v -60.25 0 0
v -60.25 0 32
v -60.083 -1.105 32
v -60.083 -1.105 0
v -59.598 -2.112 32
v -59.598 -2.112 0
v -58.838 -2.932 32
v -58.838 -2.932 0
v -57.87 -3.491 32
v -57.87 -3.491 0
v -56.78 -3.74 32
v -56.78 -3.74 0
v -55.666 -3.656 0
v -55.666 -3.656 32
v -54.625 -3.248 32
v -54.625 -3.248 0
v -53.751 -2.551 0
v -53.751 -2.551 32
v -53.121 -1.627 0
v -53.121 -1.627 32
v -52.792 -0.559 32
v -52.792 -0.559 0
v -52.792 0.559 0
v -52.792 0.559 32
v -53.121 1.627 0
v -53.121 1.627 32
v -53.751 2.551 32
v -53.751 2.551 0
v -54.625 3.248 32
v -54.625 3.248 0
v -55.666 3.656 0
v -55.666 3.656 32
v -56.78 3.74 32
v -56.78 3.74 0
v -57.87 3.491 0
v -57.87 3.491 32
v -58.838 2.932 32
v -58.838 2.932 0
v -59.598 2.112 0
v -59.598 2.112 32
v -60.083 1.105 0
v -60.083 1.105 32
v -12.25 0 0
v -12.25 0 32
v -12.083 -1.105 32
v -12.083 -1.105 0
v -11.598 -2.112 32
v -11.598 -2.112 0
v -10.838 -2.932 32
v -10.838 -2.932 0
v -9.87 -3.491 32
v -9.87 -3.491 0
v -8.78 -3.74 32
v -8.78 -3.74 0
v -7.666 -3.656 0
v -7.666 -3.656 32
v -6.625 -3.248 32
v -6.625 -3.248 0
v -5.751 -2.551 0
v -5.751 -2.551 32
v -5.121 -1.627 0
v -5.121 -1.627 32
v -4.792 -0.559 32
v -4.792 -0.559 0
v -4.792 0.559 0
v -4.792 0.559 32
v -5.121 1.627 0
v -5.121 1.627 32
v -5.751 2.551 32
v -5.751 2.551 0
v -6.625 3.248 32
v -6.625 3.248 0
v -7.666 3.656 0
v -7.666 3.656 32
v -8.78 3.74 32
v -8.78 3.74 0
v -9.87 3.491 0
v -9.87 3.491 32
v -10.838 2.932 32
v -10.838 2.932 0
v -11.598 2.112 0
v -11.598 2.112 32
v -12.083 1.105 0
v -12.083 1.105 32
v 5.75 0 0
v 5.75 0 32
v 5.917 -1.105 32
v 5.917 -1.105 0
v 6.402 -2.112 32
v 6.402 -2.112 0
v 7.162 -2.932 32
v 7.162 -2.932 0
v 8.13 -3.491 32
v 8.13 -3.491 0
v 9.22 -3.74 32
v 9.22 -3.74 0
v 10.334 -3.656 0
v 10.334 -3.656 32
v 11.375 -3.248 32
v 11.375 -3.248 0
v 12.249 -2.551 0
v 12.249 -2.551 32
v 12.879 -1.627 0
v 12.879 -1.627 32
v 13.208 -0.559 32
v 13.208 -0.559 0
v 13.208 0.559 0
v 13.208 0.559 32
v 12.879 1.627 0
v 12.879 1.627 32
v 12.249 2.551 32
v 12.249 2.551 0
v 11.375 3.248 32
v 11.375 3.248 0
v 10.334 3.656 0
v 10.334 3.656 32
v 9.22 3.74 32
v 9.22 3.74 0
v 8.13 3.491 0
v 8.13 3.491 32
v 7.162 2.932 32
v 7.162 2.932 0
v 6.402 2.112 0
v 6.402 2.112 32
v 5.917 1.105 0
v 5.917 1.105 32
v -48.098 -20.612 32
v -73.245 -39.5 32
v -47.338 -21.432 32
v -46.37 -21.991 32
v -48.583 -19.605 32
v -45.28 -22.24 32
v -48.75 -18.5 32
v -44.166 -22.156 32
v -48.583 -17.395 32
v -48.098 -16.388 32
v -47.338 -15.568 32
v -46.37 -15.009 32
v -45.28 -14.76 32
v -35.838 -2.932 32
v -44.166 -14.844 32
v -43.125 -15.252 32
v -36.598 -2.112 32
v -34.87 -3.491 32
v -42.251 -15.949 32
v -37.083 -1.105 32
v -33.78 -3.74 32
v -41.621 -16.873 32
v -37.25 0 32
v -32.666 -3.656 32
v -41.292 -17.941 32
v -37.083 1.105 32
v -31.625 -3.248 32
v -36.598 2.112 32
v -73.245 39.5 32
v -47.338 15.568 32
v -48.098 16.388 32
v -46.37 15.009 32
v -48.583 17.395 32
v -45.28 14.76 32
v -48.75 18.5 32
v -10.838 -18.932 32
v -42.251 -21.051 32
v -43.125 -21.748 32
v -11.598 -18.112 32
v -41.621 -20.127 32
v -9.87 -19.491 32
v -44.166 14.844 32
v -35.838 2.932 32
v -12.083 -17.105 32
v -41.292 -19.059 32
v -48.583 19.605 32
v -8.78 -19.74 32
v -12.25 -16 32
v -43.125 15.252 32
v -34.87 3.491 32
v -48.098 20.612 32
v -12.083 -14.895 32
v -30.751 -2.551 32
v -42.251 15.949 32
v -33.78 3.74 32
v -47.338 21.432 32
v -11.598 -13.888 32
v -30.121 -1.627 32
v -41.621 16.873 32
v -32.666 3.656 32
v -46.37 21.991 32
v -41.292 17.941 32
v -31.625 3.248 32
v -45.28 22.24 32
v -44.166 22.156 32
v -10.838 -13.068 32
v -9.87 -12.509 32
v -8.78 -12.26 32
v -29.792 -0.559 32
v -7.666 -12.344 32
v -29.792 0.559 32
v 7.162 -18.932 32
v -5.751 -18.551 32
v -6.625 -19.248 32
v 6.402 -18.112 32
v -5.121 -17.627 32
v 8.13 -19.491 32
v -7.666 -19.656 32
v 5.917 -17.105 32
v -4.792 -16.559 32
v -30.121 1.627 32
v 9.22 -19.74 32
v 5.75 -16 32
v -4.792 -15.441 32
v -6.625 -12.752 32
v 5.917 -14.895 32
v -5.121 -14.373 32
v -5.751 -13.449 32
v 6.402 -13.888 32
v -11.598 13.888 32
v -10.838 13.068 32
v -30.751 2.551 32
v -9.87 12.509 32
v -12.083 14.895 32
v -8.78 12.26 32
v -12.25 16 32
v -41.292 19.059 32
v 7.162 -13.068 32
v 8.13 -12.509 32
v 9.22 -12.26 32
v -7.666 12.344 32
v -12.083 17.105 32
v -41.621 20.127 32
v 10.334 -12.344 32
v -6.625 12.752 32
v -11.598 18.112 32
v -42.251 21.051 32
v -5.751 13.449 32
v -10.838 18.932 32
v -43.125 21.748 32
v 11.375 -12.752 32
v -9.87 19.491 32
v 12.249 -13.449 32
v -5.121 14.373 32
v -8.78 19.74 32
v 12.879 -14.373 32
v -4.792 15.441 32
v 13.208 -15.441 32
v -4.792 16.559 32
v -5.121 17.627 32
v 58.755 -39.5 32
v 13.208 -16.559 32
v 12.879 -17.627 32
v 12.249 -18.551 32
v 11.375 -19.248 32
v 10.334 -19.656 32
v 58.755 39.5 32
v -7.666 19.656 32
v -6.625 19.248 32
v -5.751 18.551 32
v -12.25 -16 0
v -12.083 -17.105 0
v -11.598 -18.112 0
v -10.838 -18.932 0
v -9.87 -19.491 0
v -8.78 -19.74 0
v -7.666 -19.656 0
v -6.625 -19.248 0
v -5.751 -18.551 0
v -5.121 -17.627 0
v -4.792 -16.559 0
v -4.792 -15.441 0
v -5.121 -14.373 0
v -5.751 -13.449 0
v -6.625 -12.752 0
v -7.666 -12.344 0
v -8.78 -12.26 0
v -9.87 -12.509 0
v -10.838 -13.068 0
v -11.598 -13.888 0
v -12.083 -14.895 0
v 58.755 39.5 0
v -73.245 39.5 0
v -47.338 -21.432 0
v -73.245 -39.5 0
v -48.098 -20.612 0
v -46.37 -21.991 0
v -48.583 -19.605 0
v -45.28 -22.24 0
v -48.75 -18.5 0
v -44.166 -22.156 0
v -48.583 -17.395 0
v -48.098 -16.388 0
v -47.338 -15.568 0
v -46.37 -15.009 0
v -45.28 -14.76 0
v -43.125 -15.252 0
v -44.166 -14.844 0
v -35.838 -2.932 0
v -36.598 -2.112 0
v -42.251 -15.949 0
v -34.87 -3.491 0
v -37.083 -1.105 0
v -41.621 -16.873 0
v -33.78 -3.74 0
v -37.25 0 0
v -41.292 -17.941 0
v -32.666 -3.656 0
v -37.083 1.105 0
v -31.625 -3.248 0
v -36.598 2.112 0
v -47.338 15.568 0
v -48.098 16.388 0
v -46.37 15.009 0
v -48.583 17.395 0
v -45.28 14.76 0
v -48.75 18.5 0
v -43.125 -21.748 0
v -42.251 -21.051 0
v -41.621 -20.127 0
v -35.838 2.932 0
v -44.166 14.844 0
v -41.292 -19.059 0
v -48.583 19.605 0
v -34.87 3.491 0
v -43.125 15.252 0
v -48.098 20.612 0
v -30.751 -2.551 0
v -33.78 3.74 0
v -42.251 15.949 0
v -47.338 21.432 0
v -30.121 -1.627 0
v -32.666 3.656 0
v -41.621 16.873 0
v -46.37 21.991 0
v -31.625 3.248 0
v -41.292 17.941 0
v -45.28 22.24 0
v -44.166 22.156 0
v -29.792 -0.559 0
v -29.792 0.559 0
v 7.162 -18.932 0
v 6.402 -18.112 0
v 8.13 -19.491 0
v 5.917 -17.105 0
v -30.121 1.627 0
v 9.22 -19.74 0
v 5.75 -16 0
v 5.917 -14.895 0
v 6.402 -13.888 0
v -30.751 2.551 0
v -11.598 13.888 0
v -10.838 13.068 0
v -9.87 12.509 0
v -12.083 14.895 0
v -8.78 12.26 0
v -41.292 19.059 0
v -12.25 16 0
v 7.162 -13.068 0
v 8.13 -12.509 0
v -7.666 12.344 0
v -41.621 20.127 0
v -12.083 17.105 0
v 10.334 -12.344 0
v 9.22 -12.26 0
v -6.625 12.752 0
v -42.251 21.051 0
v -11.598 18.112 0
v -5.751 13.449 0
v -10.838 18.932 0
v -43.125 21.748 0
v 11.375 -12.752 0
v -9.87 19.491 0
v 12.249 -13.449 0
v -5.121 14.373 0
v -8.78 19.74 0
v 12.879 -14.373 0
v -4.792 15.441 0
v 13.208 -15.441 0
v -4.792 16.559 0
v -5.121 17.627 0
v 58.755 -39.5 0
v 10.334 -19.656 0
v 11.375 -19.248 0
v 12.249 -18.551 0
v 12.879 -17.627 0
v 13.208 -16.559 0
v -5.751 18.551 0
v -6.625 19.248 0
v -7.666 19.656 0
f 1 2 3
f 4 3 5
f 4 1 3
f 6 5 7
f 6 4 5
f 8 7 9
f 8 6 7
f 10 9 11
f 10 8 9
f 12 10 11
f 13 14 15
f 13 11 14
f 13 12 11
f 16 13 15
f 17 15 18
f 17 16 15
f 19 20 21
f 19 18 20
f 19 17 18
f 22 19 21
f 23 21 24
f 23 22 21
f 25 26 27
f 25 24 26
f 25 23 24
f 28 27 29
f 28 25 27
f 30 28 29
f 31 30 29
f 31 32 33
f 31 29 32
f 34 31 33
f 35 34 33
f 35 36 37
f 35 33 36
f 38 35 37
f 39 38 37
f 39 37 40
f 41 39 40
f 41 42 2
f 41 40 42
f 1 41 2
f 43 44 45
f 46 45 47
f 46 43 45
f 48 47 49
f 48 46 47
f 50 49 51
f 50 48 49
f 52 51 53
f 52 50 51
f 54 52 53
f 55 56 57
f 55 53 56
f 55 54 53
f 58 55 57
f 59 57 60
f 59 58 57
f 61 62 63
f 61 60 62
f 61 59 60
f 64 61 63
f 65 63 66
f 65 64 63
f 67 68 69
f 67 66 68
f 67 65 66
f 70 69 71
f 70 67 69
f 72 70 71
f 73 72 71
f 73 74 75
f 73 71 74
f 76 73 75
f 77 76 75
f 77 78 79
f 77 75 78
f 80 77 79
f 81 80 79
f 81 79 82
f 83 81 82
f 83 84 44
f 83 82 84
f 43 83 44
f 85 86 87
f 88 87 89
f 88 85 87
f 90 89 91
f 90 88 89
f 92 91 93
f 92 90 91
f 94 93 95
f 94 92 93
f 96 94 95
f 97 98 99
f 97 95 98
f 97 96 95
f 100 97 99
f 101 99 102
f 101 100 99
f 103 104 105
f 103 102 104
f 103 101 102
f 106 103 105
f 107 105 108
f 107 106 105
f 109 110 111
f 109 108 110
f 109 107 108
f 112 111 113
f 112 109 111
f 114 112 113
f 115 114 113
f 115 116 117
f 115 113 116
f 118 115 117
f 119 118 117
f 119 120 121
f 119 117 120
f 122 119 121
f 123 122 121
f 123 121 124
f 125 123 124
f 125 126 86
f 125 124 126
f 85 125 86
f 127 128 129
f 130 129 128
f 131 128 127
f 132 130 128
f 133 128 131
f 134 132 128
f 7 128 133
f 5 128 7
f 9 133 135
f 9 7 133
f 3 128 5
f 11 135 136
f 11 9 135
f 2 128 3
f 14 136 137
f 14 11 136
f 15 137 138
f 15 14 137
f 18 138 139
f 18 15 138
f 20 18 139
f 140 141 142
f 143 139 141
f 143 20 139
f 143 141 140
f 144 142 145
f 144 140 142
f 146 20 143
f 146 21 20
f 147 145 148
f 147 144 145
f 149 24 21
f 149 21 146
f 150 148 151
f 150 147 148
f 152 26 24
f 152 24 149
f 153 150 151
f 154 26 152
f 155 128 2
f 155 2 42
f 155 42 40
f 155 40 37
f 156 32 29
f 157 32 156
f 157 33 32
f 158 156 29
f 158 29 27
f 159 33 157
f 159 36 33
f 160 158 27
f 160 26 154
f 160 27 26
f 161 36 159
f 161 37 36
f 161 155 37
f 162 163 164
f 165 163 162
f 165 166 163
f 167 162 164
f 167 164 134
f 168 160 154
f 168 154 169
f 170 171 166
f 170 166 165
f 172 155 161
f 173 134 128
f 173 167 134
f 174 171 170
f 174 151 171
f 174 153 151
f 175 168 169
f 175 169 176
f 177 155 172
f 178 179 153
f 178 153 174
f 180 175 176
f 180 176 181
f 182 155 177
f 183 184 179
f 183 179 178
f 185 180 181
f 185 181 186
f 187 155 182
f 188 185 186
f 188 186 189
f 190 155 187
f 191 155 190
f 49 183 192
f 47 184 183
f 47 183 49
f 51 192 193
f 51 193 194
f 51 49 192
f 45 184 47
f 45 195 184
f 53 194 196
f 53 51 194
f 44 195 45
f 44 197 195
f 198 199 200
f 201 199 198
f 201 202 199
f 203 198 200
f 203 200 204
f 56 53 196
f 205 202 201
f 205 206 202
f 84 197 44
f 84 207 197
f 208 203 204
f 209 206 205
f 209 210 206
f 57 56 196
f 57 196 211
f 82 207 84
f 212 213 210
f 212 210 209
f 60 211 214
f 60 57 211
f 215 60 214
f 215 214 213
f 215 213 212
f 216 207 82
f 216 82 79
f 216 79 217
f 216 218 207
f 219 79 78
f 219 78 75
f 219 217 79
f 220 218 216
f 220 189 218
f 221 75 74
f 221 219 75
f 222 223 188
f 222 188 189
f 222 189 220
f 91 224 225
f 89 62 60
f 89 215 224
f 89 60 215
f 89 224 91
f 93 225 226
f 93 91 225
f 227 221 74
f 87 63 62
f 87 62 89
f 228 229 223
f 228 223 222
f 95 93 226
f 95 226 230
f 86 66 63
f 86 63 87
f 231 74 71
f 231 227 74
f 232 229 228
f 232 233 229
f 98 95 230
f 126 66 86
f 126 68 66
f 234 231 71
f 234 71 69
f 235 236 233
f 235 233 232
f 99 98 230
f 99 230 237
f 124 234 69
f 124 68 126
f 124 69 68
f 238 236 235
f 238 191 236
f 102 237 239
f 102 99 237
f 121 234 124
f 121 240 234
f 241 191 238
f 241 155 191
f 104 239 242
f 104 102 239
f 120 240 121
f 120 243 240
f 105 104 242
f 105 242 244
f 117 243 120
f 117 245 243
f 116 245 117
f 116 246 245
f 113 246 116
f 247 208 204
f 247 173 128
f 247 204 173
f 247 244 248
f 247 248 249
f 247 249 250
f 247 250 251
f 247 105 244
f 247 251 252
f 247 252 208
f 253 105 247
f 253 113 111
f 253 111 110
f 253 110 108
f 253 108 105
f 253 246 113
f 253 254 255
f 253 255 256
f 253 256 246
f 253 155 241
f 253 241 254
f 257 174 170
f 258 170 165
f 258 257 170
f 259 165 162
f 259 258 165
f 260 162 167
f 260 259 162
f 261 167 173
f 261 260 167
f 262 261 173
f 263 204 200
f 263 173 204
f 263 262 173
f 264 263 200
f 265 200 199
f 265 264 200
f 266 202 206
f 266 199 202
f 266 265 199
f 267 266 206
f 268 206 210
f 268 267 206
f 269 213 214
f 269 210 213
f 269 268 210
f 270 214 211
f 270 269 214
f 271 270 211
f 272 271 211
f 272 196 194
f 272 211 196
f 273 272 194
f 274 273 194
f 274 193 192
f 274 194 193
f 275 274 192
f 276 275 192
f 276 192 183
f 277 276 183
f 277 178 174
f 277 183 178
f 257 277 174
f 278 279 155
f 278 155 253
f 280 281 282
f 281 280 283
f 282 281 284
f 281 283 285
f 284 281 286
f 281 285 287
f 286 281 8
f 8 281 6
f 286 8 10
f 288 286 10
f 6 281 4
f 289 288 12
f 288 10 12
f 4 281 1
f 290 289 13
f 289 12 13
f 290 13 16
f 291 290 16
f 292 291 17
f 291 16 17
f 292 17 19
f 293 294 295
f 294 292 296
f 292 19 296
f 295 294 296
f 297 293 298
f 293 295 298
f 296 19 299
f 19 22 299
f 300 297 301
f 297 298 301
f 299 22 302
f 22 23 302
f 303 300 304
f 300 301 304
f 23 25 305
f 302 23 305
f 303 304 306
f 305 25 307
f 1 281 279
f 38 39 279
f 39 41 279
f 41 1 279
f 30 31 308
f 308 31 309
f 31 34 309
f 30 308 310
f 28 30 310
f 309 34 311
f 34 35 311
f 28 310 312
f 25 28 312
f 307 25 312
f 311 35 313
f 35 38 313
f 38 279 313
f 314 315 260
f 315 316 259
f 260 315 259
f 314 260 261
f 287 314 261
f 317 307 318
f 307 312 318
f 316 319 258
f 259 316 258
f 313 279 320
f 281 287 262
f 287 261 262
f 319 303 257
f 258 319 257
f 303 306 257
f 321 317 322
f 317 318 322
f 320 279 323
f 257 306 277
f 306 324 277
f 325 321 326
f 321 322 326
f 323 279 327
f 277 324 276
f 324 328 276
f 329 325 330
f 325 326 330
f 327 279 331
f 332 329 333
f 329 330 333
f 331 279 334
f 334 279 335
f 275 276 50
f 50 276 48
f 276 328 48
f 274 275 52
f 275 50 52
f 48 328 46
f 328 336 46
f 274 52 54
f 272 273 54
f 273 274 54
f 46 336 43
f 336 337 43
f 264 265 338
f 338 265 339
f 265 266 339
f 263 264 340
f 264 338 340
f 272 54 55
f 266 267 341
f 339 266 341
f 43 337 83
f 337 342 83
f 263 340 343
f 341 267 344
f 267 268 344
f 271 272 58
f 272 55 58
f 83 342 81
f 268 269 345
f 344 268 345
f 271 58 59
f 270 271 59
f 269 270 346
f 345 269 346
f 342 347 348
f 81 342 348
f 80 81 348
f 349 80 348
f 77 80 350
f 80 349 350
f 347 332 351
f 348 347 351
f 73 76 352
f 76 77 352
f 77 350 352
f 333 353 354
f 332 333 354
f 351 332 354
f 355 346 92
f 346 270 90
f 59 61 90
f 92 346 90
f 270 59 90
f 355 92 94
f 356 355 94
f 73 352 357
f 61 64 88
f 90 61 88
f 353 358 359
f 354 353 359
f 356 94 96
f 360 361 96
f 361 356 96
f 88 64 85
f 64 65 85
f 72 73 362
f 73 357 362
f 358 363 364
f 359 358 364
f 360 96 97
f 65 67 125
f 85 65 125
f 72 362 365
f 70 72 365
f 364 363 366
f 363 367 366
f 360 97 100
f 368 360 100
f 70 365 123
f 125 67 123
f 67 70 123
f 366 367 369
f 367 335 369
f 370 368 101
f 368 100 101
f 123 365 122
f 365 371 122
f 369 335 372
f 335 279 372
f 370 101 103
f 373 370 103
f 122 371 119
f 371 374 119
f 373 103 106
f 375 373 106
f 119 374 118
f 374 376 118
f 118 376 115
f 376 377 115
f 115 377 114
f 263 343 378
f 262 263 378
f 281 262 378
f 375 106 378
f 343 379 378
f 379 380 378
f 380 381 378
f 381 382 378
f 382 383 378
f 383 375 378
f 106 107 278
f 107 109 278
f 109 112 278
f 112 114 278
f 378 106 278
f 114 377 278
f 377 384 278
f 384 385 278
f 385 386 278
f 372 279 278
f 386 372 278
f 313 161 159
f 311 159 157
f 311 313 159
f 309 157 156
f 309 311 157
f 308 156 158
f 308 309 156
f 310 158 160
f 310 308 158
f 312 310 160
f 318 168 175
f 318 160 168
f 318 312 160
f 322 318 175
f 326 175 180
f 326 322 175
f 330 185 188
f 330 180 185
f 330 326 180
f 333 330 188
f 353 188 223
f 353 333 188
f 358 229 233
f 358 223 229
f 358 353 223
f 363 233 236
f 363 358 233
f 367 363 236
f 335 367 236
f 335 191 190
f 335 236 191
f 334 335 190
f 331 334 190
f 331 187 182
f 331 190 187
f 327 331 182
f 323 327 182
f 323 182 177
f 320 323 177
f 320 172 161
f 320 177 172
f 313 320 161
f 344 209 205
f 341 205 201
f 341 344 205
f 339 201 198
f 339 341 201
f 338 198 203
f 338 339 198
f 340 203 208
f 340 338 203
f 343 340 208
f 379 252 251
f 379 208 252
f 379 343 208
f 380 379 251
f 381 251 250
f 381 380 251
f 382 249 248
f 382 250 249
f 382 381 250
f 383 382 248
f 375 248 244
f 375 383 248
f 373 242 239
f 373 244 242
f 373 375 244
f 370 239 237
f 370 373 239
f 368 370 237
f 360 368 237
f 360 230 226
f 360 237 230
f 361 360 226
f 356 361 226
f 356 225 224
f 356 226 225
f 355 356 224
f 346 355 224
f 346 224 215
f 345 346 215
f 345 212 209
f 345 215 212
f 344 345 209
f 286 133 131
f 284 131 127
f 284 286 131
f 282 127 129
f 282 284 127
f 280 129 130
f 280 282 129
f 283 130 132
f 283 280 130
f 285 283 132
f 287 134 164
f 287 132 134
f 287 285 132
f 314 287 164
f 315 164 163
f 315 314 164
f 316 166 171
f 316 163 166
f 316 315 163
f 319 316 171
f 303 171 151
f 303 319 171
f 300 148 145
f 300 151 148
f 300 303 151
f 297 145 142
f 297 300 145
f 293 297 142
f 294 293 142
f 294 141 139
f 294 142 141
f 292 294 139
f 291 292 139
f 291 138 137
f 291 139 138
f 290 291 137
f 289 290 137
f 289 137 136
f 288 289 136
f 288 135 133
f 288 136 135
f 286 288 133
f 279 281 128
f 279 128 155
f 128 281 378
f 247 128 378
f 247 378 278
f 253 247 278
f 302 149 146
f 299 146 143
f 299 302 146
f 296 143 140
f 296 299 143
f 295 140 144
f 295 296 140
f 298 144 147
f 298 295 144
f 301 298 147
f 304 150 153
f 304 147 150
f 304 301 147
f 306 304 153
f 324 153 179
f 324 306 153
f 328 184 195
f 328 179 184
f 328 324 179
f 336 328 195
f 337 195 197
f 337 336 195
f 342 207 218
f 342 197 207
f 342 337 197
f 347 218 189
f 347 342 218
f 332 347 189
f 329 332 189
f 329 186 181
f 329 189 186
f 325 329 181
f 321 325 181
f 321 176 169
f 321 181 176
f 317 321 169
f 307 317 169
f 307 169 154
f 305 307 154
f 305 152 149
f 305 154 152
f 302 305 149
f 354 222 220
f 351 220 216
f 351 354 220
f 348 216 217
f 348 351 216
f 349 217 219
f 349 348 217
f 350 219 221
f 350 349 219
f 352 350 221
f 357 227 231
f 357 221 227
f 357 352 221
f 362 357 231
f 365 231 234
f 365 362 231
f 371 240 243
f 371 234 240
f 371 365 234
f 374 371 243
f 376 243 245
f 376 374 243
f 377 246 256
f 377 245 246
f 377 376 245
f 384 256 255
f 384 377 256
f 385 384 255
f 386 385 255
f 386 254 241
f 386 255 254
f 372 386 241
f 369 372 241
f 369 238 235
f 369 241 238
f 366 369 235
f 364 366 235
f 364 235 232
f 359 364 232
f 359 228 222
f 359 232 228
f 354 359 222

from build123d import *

# Parameters (mm, degrees)
SKETCH1_W           = 132
SKETCH1_H           = 79
BOSS_EXTRUDE2_DEPTH = 32
SKETCH1_6_R         = 3.75
CUT_EXTRUDE15_DEPTH = 42


with BuildPart() as part:
    # Sketch1 → Boss-Extrude2 (new body)
    with BuildSketch(Plane.XY):
        with Locations((-7.24491948, 0)):
            Rectangle(SKETCH1_W, SKETCH1_H)
    extrude(amount=BOSS_EXTRUDE2_DEPTH)

    # Sketch1<6> → Cut-Extrude15 (cut)
    with BuildSketch(Plane.XY):
        with Locations((-45, 18.5)):
            Circle(SKETCH1_6_R)
        with Locations((-45, -18.5)):
            Circle(SKETCH1_6_R)
        with Locations((-56.5, 0)):
            Circle(SKETCH1_6_R)
        with Locations((-33.5, 0)):
            Circle(SKETCH1_6_R)
        with Locations((-8.5, 0)):
            Circle(SKETCH1_6_R)
        with Locations((-8.5, -16)):
            Circle(SKETCH1_6_R)
        with Locations((-8.5, 16)):
            Circle(SKETCH1_6_R)
        with Locations((9.5, -16)):
            Circle(SKETCH1_6_R)
        with Locations((9.5, 0)):
            Circle(SKETCH1_6_R)
    extrude(amount=CUT_EXTRUDE15_DEPTH, mode=Mode.SUBTRACT)


solid = part.part
